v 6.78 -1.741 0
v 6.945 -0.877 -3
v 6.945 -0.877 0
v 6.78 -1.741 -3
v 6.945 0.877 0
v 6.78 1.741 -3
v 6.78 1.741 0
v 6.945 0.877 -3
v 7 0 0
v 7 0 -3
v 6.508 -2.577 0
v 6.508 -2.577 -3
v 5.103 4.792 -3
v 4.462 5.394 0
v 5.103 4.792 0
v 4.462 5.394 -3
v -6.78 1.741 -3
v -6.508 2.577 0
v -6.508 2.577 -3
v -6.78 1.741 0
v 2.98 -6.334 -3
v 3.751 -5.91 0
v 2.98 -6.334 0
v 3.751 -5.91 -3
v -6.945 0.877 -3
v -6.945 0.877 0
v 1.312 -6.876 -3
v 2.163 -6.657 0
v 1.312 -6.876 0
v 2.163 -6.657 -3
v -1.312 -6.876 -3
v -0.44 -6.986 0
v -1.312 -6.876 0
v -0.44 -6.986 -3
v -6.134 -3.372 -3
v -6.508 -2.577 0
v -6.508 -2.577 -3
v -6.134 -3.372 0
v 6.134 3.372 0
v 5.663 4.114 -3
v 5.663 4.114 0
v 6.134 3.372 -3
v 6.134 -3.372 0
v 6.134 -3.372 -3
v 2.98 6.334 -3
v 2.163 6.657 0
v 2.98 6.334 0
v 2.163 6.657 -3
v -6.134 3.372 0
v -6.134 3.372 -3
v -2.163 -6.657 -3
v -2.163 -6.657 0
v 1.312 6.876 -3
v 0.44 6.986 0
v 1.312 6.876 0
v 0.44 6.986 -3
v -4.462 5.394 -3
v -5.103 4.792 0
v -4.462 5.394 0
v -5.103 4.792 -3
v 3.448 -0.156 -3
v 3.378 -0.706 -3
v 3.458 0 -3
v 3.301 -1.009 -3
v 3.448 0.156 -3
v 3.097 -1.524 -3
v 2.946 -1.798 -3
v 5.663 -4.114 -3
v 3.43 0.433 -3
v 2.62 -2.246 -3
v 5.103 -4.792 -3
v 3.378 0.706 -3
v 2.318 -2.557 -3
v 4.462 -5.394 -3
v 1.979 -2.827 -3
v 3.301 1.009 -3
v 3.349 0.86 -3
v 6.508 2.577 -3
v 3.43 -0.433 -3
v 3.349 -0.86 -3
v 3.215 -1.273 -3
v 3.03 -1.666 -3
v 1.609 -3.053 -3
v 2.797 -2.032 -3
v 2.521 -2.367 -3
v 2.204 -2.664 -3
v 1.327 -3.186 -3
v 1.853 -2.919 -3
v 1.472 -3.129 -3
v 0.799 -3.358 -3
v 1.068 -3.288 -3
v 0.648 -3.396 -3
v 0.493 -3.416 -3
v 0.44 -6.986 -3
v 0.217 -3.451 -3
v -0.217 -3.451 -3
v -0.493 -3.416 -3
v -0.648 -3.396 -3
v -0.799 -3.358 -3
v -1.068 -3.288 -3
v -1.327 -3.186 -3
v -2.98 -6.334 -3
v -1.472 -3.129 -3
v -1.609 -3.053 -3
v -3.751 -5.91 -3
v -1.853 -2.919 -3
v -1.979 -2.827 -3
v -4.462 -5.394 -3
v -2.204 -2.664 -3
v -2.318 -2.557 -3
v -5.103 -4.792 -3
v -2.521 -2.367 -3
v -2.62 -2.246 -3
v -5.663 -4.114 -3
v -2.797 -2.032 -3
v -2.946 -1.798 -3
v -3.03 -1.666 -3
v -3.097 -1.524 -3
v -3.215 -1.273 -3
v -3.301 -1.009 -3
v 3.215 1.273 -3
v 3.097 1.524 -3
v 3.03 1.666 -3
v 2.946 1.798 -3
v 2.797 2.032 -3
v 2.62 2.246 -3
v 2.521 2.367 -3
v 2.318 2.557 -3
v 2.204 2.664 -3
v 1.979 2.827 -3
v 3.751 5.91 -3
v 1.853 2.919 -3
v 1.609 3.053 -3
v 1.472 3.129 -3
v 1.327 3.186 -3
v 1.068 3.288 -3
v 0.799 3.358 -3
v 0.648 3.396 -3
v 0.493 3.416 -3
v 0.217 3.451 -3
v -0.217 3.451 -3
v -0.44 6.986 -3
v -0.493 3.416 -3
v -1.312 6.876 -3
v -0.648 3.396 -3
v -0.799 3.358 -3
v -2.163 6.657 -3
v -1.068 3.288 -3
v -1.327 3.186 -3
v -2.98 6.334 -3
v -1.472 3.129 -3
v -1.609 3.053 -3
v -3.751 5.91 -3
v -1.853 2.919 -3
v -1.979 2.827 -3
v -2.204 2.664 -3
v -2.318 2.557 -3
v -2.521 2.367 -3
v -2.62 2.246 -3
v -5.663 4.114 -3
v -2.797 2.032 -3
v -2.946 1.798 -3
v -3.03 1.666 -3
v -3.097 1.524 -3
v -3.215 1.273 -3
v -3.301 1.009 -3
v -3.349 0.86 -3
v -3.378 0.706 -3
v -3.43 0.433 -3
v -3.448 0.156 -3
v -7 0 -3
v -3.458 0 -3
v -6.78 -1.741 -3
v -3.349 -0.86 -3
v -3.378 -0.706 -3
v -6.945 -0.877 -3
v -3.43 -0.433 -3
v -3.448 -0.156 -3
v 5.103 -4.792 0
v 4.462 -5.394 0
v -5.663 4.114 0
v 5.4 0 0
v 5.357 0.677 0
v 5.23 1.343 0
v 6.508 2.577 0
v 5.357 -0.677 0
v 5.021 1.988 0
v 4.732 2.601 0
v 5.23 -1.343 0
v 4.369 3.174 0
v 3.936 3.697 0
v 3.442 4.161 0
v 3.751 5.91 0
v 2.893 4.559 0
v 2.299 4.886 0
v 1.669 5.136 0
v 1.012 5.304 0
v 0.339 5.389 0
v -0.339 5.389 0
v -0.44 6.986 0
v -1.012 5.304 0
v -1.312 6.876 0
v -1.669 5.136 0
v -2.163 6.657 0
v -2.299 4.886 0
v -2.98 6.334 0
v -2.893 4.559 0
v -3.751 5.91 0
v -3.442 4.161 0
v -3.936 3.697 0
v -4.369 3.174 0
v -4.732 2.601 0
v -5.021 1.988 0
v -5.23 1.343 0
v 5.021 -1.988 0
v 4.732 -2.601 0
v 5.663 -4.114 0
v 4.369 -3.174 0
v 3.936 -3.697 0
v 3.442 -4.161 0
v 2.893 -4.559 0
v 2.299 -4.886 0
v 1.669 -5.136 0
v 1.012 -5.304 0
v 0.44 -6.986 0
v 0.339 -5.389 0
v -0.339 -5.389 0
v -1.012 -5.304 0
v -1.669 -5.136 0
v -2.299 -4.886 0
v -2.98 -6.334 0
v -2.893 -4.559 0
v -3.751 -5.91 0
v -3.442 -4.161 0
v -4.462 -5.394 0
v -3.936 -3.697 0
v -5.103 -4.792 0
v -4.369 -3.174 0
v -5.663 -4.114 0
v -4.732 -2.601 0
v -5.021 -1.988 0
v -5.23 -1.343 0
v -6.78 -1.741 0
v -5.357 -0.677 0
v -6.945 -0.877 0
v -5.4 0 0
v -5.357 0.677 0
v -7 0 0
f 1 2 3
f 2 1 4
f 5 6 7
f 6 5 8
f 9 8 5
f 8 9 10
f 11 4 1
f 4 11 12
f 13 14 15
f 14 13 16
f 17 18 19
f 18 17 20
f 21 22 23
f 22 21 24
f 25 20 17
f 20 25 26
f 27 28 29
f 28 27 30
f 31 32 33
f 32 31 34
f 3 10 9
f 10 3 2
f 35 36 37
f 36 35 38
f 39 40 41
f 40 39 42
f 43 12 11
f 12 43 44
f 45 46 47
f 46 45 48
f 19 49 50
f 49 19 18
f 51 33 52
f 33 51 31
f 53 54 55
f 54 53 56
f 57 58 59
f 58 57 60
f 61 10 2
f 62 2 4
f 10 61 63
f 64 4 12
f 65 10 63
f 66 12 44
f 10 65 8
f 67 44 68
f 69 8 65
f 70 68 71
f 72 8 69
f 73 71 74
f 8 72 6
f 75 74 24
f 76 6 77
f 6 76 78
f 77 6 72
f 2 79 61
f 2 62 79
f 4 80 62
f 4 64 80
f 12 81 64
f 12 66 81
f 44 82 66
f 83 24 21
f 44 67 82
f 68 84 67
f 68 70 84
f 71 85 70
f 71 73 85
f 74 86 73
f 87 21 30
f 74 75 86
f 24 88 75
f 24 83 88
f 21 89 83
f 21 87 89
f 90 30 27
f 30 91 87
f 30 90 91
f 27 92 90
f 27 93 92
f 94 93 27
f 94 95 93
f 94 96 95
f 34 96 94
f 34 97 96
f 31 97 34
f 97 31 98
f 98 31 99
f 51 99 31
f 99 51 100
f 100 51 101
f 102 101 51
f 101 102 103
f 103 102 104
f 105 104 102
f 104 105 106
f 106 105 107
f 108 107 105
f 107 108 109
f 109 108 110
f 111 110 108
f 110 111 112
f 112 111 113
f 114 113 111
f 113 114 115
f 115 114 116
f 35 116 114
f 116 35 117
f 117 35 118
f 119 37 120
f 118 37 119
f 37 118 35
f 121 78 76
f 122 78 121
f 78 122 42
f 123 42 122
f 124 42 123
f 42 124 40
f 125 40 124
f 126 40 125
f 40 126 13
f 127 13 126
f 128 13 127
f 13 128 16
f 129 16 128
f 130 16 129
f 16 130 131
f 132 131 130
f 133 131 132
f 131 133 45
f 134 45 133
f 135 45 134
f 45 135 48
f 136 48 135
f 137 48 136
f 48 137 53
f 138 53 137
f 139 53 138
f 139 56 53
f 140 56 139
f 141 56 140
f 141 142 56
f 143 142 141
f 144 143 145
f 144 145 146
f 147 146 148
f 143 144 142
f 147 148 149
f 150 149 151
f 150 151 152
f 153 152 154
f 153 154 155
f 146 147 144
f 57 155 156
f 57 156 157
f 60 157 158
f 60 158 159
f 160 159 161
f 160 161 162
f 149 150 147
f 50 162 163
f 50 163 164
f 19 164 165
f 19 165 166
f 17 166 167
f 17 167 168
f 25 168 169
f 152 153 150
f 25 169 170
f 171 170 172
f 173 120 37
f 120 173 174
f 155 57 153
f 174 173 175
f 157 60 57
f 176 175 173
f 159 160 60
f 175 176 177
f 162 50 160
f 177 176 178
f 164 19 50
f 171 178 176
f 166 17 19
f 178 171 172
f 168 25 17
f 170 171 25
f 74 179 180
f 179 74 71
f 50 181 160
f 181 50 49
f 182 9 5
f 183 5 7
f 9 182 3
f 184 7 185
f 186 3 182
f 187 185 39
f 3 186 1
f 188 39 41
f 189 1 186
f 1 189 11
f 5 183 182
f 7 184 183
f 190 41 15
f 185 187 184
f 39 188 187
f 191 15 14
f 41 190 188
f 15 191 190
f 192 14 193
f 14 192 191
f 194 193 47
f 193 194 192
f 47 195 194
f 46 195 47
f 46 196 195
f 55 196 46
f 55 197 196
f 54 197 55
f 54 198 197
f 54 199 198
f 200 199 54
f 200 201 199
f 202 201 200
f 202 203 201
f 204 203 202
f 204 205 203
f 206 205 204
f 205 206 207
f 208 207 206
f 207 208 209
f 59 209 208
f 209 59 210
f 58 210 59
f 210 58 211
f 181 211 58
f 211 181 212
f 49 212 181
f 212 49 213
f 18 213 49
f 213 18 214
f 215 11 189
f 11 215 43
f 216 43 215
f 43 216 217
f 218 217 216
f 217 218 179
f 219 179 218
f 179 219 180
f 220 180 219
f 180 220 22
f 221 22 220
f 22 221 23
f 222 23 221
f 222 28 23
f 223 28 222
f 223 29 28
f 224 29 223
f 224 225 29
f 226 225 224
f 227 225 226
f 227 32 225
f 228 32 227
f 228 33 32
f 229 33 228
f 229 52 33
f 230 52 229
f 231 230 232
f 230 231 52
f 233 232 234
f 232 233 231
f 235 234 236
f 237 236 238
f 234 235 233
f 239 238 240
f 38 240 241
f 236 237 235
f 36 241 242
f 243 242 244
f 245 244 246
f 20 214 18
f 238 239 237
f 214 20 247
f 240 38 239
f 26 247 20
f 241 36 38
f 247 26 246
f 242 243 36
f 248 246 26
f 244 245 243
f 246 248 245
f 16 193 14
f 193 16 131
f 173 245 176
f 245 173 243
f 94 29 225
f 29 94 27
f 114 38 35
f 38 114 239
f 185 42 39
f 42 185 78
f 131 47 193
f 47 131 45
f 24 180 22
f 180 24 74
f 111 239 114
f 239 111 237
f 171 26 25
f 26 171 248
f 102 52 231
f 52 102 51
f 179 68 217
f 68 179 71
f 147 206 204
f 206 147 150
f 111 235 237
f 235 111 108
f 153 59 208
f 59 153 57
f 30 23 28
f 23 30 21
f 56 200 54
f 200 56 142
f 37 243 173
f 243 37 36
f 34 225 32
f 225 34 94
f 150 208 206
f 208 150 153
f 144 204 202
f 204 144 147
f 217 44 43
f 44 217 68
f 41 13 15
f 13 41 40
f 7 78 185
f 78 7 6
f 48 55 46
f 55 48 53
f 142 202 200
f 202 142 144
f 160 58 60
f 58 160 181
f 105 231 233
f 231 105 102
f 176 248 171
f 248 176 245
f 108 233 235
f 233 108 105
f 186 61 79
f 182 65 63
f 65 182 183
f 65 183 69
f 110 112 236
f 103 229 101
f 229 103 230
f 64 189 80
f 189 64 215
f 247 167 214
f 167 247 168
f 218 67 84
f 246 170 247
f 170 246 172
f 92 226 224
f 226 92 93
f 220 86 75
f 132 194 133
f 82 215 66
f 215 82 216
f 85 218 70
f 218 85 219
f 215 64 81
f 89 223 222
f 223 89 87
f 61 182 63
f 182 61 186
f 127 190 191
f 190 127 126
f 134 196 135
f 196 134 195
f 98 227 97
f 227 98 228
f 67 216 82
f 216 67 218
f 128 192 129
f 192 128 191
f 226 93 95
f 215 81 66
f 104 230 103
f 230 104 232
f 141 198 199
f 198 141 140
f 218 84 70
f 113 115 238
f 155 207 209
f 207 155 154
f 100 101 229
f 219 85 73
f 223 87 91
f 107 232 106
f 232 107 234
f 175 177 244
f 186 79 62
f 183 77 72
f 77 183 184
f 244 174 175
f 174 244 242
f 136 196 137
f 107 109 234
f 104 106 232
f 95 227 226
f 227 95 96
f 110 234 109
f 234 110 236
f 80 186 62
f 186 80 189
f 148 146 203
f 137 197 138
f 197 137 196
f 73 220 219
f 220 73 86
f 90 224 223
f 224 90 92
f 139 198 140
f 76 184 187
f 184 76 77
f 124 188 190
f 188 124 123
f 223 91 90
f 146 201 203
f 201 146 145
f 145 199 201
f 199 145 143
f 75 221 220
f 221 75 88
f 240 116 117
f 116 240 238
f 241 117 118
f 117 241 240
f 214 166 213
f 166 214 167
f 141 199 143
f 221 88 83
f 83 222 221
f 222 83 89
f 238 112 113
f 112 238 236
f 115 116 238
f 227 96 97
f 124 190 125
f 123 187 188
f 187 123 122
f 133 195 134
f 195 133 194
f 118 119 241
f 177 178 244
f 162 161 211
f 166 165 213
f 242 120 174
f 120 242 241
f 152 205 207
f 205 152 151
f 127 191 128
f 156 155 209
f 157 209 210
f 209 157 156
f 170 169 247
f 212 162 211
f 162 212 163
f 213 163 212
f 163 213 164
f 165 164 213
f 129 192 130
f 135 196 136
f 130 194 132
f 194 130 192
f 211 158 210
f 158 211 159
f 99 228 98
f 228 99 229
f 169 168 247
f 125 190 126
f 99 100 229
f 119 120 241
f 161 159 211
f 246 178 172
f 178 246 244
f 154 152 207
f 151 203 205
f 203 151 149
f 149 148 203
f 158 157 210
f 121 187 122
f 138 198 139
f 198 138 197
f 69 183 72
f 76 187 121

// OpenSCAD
$fn = 50;


difference() {
	union() {
		translate(v = [0, 0, -3.0000000000]) {
			cylinder(h = 3, r = 7.0000000000);
		}
		translate(v = [0, 0, -3.0000000000]) {
			cylinder(h = 3, r = 2.8750000000);
		}
	}
	union() {
		translate(v = [0, 0, 0]) {
			rotate(a = [0, 0, 0]) {
				difference() {
					union() {
						translate(v = [0, 0, -3.0000000000]) {
							cylinder(h = 3, r = 2.6000000000);
						}
						translate(v = [0, 0, -3.9000000000]) {
							cylinder(h = 3.9000000000, r1 = 2.8750000000, r2 = 5.4000000000);
						}
						translate(v = [0, 0, -3.0000000000]) {
							cylinder(h = 3, r = 2.8750000000);
						}
						translate(v = [0, 0, -3.0000000000]) {
							cylinder(h = 3, r = 2.6000000000);
						}
					}
					union();
				}
			}
		}
	}
}
